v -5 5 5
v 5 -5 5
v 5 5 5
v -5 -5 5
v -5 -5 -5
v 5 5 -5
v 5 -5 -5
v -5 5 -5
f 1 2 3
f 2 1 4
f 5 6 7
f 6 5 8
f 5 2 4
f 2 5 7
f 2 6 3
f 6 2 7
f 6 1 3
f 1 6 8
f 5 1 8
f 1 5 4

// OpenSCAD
// Generated Cube - Identical to Reference
cube([10, 10, 10], center=true); 
